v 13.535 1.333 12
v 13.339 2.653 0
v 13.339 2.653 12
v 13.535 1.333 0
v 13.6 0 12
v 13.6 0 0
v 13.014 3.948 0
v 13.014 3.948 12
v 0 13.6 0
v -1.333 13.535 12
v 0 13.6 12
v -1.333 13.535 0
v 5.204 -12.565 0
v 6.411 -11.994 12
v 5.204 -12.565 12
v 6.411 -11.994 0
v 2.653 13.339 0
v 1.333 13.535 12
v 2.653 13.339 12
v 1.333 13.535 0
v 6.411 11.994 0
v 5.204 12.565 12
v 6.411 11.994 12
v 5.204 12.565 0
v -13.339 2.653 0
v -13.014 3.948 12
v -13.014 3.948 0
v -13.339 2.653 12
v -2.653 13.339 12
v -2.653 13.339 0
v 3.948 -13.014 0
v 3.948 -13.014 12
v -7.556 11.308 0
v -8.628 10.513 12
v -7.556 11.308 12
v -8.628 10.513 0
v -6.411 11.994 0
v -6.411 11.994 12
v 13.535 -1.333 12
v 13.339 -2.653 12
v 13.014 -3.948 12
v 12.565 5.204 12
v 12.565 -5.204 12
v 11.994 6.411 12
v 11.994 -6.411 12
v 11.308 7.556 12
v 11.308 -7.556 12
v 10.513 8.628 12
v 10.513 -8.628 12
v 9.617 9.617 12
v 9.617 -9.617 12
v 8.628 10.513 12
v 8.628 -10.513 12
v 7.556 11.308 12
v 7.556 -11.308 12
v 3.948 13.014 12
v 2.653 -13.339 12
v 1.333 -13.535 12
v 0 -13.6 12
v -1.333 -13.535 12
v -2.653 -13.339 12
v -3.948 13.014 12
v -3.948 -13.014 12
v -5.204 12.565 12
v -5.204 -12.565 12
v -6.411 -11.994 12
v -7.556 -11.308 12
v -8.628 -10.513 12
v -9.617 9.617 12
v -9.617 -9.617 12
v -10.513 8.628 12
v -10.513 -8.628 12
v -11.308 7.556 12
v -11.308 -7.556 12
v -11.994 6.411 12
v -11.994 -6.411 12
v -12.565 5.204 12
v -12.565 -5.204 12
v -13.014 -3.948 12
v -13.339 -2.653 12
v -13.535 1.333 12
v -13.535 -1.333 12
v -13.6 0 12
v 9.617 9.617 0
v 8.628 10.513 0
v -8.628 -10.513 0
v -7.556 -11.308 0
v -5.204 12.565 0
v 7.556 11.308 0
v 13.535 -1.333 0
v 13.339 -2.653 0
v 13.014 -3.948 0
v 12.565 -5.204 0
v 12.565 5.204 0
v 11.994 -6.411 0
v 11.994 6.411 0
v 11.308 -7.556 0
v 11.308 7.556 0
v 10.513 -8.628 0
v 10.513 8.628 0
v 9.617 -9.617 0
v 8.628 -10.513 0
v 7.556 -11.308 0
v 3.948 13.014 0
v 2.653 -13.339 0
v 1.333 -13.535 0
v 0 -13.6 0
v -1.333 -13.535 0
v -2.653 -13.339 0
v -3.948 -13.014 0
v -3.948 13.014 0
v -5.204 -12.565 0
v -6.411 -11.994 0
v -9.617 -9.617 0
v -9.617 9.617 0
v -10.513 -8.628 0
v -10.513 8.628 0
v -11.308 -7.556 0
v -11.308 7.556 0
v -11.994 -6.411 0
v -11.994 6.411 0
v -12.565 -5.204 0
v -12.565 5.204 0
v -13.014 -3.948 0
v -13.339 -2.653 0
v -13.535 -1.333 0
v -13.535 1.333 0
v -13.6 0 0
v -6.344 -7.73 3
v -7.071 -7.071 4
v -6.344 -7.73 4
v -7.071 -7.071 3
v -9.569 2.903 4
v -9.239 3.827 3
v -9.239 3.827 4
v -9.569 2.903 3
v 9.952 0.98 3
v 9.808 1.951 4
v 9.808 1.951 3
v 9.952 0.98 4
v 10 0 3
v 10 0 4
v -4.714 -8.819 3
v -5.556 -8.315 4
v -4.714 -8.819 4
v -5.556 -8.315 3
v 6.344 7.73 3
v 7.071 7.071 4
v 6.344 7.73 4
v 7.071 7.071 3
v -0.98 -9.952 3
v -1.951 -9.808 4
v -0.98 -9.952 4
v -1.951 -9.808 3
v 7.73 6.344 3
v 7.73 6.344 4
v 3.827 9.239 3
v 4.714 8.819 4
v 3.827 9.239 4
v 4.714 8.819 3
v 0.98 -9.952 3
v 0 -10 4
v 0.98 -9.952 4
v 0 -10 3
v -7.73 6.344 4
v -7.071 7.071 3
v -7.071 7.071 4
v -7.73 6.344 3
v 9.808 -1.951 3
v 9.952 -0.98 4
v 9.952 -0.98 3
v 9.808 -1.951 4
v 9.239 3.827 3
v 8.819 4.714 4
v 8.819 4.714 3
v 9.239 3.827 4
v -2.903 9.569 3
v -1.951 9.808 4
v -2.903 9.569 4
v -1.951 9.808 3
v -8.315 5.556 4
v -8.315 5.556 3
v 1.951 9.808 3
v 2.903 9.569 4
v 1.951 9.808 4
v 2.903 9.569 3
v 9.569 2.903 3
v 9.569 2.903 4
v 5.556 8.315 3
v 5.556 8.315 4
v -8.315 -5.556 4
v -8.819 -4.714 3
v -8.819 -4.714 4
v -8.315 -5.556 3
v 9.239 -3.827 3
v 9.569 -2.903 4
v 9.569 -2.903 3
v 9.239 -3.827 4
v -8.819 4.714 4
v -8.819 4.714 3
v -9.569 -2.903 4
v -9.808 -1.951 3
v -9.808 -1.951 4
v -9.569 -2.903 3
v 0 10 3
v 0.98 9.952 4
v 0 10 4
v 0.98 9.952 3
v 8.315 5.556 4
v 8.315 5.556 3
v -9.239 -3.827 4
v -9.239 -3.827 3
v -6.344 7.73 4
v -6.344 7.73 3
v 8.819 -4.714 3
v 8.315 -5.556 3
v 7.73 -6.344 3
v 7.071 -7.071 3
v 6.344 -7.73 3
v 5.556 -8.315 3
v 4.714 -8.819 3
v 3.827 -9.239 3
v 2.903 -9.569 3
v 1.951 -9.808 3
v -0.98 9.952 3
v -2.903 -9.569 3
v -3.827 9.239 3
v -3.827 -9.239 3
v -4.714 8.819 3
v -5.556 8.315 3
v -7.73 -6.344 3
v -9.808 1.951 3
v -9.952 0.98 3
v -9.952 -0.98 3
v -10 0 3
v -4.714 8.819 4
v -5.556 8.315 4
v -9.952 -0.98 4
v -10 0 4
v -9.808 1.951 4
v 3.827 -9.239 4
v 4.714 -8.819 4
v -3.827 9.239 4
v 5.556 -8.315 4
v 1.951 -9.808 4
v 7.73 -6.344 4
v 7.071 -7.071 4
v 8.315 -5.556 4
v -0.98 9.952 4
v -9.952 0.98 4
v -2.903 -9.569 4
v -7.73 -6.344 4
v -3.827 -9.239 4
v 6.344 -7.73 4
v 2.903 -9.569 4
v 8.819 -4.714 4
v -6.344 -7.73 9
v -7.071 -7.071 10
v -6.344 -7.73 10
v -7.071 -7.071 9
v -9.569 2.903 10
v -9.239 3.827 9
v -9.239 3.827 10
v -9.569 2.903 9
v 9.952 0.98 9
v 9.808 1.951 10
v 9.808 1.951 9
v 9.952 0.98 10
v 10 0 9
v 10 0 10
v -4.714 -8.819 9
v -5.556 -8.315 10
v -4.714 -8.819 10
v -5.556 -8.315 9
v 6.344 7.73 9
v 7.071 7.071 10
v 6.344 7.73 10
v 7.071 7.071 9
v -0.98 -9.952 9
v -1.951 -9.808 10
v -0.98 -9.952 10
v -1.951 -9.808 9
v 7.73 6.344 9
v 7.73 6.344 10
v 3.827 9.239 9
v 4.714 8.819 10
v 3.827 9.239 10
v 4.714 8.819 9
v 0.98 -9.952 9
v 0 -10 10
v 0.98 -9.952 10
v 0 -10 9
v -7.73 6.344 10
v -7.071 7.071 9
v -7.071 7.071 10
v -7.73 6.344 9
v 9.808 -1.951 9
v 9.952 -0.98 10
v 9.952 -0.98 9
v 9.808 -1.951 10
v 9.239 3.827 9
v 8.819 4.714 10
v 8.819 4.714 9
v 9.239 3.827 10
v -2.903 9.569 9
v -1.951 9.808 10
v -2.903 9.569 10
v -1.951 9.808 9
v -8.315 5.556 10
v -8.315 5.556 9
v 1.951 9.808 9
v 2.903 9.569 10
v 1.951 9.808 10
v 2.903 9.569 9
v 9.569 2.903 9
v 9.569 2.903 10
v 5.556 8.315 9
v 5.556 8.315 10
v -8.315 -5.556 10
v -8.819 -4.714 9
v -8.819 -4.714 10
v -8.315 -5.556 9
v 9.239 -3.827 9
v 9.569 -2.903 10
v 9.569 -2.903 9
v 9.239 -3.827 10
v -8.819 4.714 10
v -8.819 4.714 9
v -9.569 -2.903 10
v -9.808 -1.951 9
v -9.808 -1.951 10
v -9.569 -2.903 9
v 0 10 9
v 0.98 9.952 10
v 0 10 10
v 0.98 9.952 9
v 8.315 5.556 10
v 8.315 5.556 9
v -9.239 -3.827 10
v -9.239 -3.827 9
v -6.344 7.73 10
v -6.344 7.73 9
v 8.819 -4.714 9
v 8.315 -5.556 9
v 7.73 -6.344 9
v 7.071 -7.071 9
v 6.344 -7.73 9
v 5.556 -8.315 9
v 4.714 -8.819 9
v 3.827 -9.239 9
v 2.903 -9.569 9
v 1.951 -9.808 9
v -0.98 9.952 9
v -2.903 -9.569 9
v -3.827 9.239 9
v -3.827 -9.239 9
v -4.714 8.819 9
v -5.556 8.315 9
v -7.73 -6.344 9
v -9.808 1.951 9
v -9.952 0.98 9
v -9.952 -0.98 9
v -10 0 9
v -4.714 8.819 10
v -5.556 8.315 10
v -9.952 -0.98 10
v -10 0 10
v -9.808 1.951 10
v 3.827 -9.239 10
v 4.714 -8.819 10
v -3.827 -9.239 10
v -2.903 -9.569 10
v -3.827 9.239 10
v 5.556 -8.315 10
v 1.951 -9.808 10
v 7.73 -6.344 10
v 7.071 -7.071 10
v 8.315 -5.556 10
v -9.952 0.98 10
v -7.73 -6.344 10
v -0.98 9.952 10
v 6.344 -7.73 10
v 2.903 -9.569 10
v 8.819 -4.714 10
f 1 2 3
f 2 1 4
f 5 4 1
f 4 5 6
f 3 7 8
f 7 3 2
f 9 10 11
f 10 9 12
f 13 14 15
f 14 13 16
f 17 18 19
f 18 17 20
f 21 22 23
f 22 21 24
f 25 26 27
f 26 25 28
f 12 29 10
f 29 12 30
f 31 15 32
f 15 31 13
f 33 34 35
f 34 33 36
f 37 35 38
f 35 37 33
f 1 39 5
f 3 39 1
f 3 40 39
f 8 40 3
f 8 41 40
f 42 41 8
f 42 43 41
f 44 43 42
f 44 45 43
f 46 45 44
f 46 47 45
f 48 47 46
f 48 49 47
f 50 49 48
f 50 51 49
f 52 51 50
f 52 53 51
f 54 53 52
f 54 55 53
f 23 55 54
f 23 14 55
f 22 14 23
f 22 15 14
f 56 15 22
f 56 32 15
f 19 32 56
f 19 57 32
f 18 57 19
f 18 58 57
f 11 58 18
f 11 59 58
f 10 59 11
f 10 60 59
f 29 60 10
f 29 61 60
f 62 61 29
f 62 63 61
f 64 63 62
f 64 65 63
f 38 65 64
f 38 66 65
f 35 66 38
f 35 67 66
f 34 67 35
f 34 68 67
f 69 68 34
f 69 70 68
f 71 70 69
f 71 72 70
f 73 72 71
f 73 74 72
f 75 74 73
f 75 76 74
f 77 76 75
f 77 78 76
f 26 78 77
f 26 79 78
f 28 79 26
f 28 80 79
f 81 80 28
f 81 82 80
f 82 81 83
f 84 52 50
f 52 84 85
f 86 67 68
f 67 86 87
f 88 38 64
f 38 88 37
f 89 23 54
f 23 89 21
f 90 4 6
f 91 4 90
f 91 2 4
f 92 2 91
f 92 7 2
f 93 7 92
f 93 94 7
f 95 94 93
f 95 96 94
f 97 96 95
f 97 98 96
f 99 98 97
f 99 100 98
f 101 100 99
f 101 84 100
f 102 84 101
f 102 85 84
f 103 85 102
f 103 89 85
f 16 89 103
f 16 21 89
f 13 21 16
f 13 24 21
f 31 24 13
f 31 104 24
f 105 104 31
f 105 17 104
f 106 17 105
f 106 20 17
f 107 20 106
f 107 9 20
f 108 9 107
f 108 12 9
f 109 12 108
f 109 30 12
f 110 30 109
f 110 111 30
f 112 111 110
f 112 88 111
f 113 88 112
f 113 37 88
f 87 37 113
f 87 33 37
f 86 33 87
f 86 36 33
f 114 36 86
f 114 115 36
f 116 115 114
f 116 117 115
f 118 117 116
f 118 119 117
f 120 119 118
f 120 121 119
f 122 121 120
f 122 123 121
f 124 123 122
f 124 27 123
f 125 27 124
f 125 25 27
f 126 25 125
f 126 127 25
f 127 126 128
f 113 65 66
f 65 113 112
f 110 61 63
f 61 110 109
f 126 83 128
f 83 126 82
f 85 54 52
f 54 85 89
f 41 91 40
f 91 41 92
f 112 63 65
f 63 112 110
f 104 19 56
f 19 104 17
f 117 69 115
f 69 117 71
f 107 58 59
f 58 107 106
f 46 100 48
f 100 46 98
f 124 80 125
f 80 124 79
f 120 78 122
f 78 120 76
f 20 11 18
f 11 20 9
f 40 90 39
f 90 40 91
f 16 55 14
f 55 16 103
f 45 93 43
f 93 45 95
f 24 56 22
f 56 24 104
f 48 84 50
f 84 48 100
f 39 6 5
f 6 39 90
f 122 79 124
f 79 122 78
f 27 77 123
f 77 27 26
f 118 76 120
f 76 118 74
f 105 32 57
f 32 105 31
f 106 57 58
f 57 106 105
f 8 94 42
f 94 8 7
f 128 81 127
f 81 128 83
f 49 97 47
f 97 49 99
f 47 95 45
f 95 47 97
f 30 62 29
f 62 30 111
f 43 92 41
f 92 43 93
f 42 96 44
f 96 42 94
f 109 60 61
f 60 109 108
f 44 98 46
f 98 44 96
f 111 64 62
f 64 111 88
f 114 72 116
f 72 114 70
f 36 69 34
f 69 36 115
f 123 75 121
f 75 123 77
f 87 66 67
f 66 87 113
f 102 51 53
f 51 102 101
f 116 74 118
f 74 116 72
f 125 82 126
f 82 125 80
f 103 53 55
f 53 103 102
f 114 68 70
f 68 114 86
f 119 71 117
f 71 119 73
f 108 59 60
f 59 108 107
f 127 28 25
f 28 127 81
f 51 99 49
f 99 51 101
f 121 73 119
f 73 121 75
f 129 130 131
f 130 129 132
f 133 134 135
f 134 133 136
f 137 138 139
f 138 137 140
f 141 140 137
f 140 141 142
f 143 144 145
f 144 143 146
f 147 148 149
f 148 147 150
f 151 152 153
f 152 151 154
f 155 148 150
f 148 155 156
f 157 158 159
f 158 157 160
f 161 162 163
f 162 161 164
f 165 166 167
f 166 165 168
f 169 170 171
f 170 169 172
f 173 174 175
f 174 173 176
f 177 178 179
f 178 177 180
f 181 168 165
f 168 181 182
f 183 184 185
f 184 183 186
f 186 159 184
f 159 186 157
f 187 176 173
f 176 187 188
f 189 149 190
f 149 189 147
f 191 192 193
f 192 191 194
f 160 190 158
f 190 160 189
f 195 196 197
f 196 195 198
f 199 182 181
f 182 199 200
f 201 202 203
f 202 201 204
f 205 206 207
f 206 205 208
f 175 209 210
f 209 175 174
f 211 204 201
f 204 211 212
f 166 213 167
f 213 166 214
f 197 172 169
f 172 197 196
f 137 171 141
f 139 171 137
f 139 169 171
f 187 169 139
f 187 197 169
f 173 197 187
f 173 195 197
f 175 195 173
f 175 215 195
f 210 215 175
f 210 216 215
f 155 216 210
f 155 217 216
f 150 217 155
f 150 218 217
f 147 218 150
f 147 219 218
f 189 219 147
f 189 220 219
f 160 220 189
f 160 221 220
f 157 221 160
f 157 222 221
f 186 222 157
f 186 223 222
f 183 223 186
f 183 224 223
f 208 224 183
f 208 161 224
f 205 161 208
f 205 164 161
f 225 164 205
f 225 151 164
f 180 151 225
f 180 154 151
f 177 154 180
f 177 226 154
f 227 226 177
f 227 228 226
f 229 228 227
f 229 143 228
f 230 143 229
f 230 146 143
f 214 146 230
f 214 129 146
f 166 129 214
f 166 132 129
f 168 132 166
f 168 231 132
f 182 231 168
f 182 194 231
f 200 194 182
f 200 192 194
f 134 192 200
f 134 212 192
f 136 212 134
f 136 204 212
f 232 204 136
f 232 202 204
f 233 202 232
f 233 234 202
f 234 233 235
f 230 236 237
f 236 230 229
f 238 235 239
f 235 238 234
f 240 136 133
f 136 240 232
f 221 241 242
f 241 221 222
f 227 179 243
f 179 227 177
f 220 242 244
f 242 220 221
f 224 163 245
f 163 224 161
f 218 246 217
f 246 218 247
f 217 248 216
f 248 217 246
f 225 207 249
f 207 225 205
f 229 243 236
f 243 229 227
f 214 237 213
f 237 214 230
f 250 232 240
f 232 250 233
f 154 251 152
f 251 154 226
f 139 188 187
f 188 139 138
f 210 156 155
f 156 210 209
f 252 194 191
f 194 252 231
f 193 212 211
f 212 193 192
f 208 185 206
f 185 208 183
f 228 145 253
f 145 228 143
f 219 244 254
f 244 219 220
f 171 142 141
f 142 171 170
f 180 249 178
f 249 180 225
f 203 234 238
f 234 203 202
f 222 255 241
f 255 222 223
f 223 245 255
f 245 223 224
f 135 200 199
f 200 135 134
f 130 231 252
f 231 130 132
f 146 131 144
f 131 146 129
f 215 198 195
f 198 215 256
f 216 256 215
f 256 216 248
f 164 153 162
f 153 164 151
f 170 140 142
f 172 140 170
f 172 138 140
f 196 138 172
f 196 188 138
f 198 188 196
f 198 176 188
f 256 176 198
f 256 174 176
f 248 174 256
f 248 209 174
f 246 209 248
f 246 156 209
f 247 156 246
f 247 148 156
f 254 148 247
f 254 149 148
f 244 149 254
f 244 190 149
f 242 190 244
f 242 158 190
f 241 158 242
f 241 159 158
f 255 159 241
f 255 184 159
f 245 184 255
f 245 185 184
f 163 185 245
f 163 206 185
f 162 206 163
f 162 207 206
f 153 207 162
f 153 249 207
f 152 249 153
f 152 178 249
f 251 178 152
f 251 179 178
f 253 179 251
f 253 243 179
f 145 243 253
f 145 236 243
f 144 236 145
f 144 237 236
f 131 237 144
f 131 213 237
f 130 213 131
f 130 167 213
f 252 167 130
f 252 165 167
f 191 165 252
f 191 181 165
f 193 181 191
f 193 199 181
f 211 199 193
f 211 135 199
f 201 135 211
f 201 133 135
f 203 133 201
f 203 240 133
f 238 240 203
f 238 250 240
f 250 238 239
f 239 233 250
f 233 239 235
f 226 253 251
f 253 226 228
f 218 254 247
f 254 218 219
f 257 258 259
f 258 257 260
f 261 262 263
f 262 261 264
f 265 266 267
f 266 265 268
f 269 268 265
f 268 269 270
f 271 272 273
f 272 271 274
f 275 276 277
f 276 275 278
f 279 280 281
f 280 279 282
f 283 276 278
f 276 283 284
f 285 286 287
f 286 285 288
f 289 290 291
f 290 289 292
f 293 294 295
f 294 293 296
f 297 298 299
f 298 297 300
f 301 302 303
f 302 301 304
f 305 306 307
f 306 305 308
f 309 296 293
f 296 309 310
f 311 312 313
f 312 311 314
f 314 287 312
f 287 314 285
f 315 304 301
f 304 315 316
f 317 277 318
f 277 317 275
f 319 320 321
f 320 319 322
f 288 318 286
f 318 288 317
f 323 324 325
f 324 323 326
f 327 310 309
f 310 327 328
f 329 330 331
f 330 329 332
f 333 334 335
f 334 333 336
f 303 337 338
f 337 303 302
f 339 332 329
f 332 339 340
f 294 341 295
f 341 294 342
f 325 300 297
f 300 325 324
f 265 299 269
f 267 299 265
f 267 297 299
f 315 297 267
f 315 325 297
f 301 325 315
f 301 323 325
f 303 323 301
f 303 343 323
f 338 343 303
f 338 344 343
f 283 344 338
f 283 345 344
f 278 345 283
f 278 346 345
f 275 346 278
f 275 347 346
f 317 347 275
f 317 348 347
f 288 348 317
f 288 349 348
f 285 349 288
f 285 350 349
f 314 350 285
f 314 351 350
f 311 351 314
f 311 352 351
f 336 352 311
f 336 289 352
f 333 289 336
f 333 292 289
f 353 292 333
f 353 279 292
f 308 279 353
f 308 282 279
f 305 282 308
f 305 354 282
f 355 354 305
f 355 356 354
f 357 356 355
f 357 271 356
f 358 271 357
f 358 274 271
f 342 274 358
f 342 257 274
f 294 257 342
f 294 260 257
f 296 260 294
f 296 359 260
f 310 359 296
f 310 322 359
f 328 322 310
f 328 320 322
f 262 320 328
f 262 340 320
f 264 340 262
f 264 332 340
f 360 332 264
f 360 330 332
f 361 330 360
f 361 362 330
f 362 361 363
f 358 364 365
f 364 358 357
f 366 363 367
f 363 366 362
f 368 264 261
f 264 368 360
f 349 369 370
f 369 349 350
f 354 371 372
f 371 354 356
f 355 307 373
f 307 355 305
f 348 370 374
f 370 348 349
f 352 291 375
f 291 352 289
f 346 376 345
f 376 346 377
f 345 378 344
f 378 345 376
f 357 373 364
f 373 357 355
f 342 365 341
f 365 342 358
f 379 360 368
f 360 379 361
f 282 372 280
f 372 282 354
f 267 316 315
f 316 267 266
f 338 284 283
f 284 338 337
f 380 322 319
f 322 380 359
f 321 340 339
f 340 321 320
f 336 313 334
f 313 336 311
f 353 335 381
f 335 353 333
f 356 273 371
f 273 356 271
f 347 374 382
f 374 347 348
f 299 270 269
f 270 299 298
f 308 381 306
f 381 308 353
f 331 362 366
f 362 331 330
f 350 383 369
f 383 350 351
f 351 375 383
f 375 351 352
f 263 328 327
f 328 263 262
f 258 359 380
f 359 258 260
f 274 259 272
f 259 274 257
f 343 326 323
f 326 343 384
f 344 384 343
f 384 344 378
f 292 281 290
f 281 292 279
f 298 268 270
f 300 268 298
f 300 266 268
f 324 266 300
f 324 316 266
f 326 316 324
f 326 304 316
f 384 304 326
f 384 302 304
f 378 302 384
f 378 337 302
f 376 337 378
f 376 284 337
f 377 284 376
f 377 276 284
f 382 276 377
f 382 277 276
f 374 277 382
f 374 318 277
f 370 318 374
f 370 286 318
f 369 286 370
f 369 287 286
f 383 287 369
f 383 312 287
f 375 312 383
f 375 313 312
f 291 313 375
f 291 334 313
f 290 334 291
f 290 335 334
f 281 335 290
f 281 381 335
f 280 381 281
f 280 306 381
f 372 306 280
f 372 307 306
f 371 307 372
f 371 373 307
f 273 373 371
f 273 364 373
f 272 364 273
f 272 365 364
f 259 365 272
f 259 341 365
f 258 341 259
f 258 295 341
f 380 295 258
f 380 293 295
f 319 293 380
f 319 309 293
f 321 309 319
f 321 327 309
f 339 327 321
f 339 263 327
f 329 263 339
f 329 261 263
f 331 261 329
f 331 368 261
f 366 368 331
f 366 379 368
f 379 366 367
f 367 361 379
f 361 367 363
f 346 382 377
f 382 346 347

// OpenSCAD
module stepped_cylindrical_sleeve() {
    difference() {
        union() {
            // Main body
            cylinder(h=12, d1=27.2, d2=27.2, $fn=64);
            
            // First step
            translate([0, 0, 2])
                cylinder(h=2, d1=25, d2=25, $fn=64);
            
            // Second step
            translate([0, 0, 4])
                cylinder(h=2, d1=23, d2=23, $fn=64);
            
            // Third step
            translate([0, 0, 6])
                cylinder(h=2, d1=21, d2=21, $fn=64);
            
            // Fourth step
            translate([0, 0, 8])
                cylinder(h=2, d1=23, d2=23, $fn=64);
            
            // Fifth step
            translate([0, 0, 10])
                cylinder(h=2, d1=25, d2=25, $fn=64);
        }
        
        // Recessed bands
        translate([0, 0, 3])
            cylinder(h=1, d1=20, d2=20, $fn=64);
        
        translate([0, 0, 9])
            cylinder(h=1, d1=20, d2=20, $fn=64);
    }
}

stepped_cylindrical_sleeve();
